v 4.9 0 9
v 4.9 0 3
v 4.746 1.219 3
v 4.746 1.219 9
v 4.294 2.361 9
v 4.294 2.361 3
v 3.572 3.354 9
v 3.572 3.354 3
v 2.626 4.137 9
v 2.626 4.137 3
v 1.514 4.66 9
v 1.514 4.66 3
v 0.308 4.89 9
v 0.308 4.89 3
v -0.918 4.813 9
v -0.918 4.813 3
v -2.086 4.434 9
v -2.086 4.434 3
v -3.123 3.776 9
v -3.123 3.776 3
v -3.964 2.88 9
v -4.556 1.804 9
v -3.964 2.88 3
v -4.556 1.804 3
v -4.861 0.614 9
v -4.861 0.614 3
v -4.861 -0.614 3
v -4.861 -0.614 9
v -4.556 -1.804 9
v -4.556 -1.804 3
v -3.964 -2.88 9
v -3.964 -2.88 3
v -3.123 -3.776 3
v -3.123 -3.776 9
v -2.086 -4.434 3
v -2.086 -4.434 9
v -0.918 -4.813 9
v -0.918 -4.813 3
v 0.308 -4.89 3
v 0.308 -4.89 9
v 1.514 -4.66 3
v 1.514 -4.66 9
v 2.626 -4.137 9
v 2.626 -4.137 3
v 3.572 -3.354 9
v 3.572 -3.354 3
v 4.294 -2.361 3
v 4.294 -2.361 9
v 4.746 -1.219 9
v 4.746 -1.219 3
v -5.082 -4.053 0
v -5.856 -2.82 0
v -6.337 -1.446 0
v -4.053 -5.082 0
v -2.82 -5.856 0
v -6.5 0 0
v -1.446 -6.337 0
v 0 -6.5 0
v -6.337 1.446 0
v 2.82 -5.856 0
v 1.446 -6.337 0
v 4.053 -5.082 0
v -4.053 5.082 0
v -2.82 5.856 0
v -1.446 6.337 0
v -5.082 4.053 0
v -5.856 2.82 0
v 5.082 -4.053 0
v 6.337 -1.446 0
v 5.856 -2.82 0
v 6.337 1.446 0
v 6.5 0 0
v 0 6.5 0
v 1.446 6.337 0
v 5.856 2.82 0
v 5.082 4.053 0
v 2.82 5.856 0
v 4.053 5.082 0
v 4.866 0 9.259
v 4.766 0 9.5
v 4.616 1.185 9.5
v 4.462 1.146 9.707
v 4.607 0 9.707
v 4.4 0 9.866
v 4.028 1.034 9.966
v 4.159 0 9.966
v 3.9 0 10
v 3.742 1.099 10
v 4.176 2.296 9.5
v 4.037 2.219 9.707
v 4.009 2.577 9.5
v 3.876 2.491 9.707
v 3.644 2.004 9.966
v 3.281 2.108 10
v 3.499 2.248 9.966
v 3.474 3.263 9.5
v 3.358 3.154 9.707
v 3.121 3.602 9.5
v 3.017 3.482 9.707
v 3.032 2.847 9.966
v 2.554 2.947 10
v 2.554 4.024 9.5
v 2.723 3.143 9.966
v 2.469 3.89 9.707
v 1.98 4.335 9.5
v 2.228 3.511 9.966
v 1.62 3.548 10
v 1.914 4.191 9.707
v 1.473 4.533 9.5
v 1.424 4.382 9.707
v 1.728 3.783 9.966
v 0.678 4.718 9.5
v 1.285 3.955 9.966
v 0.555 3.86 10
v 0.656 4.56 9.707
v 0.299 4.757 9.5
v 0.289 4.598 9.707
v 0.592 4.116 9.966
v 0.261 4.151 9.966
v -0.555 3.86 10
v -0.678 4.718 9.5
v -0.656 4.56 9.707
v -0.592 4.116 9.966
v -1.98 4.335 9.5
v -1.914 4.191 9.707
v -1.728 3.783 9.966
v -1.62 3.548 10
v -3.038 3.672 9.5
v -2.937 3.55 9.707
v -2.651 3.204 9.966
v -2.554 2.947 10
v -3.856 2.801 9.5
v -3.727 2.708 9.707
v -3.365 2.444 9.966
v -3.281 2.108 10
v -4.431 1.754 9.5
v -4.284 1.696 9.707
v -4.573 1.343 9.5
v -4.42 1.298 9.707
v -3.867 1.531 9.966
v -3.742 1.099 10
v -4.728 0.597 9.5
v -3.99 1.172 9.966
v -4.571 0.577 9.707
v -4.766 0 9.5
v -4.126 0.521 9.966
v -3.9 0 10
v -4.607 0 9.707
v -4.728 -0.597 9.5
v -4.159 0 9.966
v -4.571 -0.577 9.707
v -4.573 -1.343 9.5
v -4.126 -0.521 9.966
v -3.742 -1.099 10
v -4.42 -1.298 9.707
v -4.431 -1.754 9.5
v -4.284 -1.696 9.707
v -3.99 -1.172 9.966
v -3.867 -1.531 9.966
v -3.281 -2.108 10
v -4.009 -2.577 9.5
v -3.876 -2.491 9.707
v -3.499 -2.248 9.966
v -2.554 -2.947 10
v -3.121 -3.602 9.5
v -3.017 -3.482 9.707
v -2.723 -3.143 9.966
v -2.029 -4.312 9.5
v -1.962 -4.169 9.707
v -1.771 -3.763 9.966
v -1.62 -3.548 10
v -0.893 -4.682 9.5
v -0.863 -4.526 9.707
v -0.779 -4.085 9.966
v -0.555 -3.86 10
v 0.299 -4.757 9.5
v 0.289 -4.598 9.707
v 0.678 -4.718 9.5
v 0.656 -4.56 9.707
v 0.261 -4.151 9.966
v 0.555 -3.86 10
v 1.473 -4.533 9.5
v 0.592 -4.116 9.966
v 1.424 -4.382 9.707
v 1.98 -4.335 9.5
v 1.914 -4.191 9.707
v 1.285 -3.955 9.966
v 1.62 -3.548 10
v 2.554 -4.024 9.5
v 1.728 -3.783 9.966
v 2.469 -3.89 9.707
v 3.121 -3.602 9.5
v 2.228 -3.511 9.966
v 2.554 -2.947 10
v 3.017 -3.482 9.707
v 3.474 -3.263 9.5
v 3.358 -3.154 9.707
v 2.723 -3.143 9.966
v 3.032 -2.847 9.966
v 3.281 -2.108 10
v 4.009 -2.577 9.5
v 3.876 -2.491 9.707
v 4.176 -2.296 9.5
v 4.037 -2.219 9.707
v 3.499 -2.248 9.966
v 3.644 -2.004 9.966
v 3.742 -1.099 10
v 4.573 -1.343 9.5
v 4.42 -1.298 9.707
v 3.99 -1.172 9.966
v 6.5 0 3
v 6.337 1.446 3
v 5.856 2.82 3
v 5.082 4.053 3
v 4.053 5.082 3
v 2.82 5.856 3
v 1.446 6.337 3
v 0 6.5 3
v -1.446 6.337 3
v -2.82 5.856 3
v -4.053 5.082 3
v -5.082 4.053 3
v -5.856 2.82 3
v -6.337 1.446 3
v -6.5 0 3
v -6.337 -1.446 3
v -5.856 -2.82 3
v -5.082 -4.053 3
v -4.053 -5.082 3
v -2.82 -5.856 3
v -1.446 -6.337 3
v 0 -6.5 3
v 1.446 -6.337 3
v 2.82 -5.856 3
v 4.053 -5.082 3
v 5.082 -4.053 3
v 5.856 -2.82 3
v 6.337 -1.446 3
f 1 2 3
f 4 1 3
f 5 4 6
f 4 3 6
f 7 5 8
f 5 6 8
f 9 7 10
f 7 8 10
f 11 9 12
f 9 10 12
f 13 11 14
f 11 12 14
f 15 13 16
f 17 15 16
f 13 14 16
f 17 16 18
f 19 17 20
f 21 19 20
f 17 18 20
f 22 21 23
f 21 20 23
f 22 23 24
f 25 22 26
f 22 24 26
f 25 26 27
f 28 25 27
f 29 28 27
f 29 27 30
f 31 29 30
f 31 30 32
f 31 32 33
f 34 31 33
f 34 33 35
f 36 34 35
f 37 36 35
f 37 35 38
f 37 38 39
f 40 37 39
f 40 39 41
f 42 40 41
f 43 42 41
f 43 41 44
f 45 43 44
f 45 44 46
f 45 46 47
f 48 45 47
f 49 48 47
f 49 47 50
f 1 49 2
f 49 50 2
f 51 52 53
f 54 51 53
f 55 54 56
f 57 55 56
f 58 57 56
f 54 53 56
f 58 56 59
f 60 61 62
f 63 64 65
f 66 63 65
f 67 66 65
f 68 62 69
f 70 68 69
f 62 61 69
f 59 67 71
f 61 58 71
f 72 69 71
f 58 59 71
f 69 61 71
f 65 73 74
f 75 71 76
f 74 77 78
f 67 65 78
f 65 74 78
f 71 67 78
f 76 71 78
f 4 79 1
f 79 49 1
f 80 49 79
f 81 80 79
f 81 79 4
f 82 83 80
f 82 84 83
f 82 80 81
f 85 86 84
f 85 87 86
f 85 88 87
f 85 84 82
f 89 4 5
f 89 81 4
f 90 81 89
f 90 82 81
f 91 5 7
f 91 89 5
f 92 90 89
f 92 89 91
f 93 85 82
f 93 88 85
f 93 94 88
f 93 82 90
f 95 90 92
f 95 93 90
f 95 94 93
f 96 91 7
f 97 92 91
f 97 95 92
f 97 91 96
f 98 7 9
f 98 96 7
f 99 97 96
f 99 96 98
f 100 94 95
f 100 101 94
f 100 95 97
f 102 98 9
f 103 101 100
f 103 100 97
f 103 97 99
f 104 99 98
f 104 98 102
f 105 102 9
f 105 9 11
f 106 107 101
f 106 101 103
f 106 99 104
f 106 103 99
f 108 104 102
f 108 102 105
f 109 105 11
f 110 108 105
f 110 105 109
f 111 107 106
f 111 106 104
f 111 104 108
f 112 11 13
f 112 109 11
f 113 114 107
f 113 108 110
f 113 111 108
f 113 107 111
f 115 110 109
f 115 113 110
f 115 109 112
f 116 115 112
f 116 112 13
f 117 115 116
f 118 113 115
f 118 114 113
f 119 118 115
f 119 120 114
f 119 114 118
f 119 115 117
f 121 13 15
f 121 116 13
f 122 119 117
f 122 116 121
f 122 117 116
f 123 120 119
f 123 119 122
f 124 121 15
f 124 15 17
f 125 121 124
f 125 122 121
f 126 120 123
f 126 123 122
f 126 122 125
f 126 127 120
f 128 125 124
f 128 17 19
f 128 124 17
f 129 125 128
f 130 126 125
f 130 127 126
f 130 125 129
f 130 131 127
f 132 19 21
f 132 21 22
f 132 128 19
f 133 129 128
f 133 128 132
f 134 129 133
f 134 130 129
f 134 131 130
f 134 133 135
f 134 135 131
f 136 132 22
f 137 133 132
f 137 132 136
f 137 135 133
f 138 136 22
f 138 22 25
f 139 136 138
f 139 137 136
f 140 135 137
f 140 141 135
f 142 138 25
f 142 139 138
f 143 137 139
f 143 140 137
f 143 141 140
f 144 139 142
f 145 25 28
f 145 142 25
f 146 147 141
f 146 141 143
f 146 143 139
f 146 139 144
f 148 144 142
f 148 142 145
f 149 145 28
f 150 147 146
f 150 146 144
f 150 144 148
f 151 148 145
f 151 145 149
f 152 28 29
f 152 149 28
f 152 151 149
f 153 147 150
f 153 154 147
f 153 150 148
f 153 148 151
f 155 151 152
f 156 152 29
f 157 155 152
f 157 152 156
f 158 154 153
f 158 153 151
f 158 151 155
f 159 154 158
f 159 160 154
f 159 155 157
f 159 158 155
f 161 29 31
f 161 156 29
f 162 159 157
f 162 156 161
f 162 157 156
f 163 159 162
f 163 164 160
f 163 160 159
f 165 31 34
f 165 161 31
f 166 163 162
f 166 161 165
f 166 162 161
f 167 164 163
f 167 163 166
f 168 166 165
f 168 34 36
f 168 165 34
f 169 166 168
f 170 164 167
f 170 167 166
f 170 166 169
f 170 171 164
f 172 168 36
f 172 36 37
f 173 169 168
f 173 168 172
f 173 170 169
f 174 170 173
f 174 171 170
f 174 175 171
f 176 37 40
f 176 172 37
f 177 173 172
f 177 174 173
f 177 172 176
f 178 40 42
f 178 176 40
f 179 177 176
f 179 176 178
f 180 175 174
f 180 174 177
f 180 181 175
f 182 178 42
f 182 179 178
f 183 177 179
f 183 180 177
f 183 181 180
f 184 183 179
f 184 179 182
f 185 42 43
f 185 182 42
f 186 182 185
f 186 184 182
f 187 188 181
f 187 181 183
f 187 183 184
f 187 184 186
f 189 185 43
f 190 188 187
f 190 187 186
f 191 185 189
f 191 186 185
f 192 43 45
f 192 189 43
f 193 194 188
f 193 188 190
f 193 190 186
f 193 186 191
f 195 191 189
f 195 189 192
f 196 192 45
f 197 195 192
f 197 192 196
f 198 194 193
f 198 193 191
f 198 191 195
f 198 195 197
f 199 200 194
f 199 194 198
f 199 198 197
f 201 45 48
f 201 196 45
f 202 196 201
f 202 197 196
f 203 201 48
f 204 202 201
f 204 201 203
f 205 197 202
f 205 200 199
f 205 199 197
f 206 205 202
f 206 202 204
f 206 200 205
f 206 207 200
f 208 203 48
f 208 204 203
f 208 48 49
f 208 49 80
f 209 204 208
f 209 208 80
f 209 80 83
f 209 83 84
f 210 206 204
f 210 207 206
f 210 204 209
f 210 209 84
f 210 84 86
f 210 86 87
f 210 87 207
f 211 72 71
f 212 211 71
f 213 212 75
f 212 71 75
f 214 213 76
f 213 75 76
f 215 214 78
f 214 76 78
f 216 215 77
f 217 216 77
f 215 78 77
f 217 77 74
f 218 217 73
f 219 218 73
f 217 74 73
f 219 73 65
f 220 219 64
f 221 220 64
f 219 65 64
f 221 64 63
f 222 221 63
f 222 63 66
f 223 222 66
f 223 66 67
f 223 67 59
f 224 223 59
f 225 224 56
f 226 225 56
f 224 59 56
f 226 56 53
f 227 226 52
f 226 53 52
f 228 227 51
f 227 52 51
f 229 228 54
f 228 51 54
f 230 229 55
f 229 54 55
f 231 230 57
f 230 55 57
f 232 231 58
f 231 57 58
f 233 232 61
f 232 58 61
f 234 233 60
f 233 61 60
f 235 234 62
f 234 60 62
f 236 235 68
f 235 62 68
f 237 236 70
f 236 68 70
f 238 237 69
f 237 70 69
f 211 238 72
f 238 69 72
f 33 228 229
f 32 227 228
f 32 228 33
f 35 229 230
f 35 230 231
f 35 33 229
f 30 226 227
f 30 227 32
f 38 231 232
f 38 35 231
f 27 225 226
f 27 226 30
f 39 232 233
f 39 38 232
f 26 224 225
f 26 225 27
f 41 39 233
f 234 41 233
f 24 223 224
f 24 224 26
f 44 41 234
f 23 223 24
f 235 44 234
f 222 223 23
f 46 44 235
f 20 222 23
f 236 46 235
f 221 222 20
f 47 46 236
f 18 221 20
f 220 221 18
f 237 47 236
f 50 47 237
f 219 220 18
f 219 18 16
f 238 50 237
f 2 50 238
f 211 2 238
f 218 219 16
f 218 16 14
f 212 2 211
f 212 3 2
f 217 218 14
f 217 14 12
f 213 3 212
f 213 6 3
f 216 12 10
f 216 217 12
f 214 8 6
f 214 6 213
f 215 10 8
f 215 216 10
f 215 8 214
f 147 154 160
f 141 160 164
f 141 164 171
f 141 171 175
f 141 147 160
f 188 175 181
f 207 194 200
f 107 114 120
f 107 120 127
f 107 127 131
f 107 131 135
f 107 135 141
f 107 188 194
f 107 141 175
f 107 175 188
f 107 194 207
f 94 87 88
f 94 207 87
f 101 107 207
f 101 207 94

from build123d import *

# Parameters (mm, degrees)
F0_R     = 6.5
F1_DEPTH = 3
F2_R     = 4.9
F3_DEPTH = 10
F4_R     = 1


with BuildPart() as f1:
    # F0 (on Top) → F1 (new body)
    with BuildSketch(Plane.XY):
        Circle(F0_R)
    extrude(amount=F1_DEPTH)

    # F2 (on Top) → F3 (join)
    with BuildSketch(Plane.XY):
        Circle(F2_R)
    extrude(amount=F3_DEPTH)

    # F4
    f4_edges = [f1.edges().sort_by_distance(p)[0] for p in [
        (-4.9, 0, 10),
    ]]
    fillet(f4_edges, radius=F4_R)


solid = f1.part
